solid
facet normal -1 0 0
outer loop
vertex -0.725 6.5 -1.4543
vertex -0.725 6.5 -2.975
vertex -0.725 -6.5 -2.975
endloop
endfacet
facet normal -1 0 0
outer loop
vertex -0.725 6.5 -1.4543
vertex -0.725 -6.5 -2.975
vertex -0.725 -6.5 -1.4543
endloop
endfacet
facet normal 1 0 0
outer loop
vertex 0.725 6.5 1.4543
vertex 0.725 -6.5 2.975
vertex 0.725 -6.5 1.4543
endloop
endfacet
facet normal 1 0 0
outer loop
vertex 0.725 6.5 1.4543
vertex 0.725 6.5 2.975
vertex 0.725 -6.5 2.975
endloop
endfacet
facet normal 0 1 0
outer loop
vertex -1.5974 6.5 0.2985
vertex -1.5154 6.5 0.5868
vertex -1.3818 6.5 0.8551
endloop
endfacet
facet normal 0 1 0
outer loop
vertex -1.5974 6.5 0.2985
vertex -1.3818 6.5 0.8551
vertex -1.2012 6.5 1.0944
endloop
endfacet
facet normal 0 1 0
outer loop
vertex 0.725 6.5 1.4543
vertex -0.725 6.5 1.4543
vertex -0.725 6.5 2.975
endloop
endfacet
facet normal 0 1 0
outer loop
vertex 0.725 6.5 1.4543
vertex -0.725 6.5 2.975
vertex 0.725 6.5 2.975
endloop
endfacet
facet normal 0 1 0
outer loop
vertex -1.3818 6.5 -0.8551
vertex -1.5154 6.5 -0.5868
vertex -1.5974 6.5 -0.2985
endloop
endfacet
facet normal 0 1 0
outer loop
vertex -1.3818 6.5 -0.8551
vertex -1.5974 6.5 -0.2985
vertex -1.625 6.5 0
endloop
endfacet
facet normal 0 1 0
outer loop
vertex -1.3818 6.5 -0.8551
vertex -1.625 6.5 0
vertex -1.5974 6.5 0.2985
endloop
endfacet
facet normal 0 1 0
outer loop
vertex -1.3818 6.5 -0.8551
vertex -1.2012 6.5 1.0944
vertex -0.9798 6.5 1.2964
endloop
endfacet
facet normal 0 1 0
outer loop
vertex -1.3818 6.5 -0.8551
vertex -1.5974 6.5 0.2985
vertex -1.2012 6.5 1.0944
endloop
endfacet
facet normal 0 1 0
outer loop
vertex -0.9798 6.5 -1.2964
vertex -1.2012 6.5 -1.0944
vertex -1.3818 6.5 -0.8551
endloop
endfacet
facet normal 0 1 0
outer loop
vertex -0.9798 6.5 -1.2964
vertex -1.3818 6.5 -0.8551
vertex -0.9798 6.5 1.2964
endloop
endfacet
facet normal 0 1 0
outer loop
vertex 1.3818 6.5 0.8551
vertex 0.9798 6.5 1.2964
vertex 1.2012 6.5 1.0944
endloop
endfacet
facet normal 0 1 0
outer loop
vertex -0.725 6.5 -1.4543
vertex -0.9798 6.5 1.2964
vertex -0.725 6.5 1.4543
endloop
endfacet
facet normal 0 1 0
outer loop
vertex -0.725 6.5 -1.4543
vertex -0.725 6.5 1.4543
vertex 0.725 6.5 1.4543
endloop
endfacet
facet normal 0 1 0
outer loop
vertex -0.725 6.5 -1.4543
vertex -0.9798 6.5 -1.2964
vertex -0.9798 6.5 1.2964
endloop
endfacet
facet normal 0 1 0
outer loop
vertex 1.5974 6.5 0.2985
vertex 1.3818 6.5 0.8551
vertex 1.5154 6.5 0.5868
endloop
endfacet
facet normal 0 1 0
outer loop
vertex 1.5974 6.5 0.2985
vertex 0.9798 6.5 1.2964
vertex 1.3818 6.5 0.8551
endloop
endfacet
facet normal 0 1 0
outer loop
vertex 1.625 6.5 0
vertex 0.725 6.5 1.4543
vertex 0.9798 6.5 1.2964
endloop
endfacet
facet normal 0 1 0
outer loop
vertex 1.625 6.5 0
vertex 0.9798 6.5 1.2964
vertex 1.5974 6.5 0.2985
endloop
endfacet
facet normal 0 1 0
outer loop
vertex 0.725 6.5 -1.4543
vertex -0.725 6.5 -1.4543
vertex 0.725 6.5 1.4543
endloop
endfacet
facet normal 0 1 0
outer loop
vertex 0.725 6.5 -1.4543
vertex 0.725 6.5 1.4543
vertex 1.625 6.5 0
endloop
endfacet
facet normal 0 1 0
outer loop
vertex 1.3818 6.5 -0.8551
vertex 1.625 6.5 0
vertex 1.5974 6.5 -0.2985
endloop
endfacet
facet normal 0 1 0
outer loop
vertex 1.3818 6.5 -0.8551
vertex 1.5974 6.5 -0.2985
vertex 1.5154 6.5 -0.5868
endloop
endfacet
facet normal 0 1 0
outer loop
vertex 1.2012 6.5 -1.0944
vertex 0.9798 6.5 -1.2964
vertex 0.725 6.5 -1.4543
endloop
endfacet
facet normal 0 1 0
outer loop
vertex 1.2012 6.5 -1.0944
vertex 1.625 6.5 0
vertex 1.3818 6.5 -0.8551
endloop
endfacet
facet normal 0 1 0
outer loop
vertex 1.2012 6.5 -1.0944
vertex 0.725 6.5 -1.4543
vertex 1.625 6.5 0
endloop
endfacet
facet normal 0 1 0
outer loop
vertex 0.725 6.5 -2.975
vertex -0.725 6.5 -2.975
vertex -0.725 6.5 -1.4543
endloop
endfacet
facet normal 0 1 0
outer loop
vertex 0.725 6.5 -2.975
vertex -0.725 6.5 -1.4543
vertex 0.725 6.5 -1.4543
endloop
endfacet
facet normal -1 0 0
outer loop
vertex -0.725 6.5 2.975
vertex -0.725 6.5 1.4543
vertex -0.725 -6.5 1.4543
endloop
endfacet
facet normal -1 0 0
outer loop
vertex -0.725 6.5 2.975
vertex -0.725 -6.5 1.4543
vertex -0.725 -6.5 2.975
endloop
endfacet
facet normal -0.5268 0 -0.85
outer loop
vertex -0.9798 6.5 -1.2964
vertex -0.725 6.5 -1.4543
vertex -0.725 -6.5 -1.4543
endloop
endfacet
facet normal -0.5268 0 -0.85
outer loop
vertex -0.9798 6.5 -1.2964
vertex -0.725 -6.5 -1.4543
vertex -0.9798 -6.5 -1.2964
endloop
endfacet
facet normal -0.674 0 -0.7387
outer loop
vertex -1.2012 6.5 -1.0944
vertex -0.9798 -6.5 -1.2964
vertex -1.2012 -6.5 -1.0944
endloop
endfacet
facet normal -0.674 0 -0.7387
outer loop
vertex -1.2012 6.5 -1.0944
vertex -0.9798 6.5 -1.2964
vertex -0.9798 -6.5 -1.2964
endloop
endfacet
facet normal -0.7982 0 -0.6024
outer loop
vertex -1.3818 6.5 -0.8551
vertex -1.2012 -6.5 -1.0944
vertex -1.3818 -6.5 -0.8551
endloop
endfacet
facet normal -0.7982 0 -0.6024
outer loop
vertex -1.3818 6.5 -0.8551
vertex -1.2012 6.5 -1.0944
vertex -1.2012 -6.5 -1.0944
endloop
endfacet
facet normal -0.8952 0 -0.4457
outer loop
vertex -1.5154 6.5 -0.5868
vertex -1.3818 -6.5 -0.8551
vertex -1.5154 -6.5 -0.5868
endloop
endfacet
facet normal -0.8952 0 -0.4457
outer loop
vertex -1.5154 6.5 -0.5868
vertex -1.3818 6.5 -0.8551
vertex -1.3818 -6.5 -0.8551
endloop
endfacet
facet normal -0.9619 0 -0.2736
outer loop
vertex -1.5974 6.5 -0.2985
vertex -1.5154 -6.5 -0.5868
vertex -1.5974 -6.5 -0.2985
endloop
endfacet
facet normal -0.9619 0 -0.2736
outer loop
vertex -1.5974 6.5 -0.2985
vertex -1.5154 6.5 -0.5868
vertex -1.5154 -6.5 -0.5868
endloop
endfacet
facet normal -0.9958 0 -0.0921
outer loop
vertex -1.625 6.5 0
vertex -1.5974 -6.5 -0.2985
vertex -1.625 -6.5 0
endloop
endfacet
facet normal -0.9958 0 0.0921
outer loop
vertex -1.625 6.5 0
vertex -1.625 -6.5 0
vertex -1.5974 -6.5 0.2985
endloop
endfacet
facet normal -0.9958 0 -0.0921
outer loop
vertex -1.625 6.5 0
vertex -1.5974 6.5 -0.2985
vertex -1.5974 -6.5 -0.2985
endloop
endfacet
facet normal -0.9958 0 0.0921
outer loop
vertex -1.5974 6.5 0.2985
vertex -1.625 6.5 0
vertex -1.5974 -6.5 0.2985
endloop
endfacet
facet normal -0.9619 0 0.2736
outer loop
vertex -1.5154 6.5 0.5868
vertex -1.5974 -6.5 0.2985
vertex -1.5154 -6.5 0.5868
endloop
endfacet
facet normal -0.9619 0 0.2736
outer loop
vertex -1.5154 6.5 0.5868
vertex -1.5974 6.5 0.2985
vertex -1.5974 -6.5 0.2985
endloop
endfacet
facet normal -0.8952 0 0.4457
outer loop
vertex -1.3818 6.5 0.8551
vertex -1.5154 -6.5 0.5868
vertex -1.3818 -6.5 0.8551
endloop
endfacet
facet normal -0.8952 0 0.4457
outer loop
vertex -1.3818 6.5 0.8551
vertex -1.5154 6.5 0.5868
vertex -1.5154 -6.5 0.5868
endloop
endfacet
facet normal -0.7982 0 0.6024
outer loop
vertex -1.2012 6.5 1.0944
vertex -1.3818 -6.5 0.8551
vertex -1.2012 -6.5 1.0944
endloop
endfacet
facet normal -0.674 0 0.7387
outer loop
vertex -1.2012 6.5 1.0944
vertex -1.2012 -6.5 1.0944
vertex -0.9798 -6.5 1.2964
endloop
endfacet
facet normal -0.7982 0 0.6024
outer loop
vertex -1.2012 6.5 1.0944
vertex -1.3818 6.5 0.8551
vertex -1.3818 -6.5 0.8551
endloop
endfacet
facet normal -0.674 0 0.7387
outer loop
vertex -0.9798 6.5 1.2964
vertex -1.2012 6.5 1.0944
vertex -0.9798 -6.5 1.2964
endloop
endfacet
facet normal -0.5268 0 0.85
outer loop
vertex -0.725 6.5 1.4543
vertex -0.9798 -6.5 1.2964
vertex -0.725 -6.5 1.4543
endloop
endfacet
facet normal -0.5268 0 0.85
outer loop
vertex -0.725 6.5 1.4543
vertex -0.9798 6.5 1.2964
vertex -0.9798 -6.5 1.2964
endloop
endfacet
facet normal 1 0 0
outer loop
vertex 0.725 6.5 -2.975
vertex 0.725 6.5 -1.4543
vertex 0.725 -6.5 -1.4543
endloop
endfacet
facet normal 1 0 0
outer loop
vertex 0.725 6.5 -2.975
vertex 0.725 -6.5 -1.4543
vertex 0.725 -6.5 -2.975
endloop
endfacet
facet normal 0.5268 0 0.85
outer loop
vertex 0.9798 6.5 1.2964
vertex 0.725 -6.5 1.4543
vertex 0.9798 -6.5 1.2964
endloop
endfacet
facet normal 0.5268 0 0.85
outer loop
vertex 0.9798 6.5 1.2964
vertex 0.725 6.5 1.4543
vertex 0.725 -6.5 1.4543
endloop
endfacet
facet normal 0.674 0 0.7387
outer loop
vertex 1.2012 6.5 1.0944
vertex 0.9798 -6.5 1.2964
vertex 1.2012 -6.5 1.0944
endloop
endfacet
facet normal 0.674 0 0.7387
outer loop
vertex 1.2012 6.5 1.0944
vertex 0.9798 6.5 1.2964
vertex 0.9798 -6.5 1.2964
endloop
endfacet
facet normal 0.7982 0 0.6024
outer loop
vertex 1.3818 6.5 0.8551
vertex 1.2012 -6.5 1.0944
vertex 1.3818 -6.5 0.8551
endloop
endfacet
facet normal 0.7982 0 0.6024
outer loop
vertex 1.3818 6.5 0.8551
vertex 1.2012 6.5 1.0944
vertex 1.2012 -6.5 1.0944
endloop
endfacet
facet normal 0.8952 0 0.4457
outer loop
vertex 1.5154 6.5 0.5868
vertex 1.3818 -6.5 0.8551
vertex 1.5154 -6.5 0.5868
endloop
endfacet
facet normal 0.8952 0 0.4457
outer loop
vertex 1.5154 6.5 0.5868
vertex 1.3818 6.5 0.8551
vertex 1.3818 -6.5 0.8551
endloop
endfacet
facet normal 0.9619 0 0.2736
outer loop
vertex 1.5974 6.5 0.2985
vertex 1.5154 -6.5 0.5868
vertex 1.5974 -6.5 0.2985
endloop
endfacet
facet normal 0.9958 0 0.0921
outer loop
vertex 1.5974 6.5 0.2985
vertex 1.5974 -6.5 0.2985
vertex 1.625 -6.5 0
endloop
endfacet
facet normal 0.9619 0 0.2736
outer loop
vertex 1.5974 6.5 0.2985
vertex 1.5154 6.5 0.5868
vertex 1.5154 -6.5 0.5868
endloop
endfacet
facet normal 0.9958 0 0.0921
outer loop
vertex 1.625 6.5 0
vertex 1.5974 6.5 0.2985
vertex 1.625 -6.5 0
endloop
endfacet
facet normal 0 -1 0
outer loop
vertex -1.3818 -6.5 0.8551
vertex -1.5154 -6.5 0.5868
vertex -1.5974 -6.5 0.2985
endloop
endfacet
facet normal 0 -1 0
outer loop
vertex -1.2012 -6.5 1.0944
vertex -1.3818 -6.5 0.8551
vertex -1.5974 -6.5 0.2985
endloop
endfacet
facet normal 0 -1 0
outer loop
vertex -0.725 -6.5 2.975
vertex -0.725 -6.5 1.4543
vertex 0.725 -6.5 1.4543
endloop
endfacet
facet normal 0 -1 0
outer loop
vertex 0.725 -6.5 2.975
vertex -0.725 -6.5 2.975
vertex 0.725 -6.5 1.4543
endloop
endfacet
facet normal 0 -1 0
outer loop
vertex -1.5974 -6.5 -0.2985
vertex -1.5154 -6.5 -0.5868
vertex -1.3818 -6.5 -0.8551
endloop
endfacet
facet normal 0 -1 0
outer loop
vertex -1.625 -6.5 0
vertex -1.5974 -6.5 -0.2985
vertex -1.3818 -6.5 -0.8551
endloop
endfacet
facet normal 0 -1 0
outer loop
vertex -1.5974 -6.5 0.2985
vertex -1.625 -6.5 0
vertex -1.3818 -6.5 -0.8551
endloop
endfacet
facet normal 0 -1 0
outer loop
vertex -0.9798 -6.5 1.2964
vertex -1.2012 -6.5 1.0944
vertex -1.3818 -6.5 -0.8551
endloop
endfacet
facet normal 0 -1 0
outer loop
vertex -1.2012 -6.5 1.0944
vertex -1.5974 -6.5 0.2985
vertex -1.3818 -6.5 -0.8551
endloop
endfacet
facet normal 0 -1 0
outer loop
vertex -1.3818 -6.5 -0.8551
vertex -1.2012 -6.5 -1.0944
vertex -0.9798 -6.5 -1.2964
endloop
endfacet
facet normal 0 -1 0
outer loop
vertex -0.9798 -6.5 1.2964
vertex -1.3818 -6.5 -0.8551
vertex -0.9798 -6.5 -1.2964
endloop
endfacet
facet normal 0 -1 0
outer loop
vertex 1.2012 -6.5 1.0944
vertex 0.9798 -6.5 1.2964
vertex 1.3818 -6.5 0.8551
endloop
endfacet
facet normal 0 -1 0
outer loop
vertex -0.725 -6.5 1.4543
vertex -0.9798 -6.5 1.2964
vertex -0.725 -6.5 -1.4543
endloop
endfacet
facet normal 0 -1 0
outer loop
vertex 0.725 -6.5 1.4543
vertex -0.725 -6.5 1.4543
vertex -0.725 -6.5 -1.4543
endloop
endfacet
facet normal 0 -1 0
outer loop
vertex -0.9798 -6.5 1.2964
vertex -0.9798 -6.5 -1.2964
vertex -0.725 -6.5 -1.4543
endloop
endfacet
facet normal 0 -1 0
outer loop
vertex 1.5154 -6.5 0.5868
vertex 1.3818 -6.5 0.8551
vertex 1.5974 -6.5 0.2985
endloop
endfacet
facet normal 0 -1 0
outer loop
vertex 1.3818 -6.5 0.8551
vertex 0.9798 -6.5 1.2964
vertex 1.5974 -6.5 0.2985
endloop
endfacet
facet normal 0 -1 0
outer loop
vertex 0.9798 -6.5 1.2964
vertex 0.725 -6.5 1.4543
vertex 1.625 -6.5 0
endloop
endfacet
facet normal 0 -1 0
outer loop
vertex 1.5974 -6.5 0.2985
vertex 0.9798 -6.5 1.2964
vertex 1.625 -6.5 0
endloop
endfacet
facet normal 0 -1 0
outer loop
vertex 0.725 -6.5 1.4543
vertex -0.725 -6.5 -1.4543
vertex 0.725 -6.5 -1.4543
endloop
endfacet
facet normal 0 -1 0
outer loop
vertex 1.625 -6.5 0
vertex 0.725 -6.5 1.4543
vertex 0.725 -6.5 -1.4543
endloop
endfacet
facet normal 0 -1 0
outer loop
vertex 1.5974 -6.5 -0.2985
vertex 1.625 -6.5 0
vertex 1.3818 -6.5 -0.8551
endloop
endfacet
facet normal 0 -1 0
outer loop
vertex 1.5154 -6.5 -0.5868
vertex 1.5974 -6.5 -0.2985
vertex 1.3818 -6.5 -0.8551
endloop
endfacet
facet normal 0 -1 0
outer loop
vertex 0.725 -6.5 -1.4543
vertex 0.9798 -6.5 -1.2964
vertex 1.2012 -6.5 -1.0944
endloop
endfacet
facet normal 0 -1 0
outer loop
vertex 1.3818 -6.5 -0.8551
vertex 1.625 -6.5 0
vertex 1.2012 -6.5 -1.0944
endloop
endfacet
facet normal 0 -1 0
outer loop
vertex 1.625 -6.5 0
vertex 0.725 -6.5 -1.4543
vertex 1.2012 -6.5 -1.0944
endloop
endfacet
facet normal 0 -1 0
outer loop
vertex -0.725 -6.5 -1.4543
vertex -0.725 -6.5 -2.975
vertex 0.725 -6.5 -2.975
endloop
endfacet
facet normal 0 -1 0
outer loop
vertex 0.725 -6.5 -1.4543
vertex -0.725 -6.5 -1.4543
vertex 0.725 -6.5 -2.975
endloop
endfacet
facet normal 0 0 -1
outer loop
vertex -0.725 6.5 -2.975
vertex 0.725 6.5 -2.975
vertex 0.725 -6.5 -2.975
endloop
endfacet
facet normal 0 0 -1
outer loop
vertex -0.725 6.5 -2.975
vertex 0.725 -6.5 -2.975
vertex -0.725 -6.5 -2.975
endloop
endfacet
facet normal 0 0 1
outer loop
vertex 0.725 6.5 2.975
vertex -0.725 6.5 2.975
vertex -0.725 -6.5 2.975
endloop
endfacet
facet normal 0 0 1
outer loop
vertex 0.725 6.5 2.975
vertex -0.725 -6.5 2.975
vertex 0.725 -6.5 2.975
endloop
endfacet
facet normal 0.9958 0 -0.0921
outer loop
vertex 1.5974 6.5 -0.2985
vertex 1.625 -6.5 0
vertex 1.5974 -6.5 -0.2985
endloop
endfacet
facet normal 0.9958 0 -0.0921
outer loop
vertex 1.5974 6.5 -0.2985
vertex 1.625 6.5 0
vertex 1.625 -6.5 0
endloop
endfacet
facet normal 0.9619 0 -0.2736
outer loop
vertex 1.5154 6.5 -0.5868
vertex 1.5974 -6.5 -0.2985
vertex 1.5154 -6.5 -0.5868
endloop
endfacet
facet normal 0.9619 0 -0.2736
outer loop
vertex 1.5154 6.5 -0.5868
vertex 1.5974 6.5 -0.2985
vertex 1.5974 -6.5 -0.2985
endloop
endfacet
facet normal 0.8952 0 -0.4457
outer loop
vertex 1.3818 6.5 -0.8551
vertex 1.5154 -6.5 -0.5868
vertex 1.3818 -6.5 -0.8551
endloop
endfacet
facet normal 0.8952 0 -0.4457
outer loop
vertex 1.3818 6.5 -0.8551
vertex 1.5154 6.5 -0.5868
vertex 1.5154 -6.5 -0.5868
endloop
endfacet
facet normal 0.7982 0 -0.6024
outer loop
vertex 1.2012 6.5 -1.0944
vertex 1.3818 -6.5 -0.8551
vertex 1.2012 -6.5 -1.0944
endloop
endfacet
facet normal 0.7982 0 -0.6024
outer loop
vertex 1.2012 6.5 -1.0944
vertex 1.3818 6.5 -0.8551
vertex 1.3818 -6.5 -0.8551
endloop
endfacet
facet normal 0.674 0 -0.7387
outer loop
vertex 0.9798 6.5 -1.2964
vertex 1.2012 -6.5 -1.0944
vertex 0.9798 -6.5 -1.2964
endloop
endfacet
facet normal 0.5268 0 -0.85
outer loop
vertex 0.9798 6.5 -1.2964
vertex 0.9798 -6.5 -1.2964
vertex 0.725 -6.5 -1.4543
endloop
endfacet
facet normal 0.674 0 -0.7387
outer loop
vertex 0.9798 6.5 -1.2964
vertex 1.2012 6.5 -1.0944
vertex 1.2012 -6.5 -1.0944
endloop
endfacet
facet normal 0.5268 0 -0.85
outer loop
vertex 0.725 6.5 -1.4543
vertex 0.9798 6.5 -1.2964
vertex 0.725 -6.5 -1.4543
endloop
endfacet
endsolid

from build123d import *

# Parameters (mm, degrees)
BOSS_EXTRUDE1_DEPTH = 6.5


with BuildPart() as part:
    # Sketch1 → Boss-Extrude1 (new, symmetric)
    with BuildSketch(Plane(origin=(0, 0, 0), x_dir=(1, 0, 0), z_dir=(0, 1, 0))):
        with BuildLine():
            ThreePointArc((1.625, 0), (1.381801361, 0.855131569), (0.725, 1.454303957))
            Line((0.725, 1.454303957), (0.725, -1.454303957))
            ThreePointArc((0.725, -1.454303957), (1.381801361, -0.855131569), (1.625, 0))
        make_face()
        with BuildLine():
            ThreePointArc((0.725, 1.454303957), (0, 1.625), (-0.725, 1.454303957))
            Line((-0.725, 1.454303957), (-0.725, -1.454303957))
            ThreePointArc((-0.725, -1.454303957), (0, -1.625), (0.725, -1.454303957))
            Line((0.725, -1.454303957), (0.725, 1.454303957))
        make_face()
        with BuildLine():
            Line((-0.725, -1.454303957), (-0.725, 1.454303957))
            ThreePointArc((-0.725, 1.454303957), (-1.625, 0), (-0.725, -1.454303957))
        make_face()
        with BuildLine():
            Line((0.725, 2.975), (-0.725, 2.975))
            Line((-0.725, 2.975), (-0.725, 1.454303957))
            ThreePointArc((-0.725, 1.454303957), (0, 1.625), (0.725, 1.454303957))
            Line((0.725, 1.454303957), (0.725, 2.975))
        make_face()
        with BuildLine():
            ThreePointArc((0.725, -1.454303957), (0, -1.625), (-0.725, -1.454303957))
            Line((-0.725, -1.454303957), (-0.725, -2.975))
            Line((-0.725, -2.975), (0.725, -2.975))
            Line((0.725, -2.975), (0.725, -1.454303957))
        make_face()
    extrude(amount=BOSS_EXTRUDE1_DEPTH, both=True)


solid = part.part
